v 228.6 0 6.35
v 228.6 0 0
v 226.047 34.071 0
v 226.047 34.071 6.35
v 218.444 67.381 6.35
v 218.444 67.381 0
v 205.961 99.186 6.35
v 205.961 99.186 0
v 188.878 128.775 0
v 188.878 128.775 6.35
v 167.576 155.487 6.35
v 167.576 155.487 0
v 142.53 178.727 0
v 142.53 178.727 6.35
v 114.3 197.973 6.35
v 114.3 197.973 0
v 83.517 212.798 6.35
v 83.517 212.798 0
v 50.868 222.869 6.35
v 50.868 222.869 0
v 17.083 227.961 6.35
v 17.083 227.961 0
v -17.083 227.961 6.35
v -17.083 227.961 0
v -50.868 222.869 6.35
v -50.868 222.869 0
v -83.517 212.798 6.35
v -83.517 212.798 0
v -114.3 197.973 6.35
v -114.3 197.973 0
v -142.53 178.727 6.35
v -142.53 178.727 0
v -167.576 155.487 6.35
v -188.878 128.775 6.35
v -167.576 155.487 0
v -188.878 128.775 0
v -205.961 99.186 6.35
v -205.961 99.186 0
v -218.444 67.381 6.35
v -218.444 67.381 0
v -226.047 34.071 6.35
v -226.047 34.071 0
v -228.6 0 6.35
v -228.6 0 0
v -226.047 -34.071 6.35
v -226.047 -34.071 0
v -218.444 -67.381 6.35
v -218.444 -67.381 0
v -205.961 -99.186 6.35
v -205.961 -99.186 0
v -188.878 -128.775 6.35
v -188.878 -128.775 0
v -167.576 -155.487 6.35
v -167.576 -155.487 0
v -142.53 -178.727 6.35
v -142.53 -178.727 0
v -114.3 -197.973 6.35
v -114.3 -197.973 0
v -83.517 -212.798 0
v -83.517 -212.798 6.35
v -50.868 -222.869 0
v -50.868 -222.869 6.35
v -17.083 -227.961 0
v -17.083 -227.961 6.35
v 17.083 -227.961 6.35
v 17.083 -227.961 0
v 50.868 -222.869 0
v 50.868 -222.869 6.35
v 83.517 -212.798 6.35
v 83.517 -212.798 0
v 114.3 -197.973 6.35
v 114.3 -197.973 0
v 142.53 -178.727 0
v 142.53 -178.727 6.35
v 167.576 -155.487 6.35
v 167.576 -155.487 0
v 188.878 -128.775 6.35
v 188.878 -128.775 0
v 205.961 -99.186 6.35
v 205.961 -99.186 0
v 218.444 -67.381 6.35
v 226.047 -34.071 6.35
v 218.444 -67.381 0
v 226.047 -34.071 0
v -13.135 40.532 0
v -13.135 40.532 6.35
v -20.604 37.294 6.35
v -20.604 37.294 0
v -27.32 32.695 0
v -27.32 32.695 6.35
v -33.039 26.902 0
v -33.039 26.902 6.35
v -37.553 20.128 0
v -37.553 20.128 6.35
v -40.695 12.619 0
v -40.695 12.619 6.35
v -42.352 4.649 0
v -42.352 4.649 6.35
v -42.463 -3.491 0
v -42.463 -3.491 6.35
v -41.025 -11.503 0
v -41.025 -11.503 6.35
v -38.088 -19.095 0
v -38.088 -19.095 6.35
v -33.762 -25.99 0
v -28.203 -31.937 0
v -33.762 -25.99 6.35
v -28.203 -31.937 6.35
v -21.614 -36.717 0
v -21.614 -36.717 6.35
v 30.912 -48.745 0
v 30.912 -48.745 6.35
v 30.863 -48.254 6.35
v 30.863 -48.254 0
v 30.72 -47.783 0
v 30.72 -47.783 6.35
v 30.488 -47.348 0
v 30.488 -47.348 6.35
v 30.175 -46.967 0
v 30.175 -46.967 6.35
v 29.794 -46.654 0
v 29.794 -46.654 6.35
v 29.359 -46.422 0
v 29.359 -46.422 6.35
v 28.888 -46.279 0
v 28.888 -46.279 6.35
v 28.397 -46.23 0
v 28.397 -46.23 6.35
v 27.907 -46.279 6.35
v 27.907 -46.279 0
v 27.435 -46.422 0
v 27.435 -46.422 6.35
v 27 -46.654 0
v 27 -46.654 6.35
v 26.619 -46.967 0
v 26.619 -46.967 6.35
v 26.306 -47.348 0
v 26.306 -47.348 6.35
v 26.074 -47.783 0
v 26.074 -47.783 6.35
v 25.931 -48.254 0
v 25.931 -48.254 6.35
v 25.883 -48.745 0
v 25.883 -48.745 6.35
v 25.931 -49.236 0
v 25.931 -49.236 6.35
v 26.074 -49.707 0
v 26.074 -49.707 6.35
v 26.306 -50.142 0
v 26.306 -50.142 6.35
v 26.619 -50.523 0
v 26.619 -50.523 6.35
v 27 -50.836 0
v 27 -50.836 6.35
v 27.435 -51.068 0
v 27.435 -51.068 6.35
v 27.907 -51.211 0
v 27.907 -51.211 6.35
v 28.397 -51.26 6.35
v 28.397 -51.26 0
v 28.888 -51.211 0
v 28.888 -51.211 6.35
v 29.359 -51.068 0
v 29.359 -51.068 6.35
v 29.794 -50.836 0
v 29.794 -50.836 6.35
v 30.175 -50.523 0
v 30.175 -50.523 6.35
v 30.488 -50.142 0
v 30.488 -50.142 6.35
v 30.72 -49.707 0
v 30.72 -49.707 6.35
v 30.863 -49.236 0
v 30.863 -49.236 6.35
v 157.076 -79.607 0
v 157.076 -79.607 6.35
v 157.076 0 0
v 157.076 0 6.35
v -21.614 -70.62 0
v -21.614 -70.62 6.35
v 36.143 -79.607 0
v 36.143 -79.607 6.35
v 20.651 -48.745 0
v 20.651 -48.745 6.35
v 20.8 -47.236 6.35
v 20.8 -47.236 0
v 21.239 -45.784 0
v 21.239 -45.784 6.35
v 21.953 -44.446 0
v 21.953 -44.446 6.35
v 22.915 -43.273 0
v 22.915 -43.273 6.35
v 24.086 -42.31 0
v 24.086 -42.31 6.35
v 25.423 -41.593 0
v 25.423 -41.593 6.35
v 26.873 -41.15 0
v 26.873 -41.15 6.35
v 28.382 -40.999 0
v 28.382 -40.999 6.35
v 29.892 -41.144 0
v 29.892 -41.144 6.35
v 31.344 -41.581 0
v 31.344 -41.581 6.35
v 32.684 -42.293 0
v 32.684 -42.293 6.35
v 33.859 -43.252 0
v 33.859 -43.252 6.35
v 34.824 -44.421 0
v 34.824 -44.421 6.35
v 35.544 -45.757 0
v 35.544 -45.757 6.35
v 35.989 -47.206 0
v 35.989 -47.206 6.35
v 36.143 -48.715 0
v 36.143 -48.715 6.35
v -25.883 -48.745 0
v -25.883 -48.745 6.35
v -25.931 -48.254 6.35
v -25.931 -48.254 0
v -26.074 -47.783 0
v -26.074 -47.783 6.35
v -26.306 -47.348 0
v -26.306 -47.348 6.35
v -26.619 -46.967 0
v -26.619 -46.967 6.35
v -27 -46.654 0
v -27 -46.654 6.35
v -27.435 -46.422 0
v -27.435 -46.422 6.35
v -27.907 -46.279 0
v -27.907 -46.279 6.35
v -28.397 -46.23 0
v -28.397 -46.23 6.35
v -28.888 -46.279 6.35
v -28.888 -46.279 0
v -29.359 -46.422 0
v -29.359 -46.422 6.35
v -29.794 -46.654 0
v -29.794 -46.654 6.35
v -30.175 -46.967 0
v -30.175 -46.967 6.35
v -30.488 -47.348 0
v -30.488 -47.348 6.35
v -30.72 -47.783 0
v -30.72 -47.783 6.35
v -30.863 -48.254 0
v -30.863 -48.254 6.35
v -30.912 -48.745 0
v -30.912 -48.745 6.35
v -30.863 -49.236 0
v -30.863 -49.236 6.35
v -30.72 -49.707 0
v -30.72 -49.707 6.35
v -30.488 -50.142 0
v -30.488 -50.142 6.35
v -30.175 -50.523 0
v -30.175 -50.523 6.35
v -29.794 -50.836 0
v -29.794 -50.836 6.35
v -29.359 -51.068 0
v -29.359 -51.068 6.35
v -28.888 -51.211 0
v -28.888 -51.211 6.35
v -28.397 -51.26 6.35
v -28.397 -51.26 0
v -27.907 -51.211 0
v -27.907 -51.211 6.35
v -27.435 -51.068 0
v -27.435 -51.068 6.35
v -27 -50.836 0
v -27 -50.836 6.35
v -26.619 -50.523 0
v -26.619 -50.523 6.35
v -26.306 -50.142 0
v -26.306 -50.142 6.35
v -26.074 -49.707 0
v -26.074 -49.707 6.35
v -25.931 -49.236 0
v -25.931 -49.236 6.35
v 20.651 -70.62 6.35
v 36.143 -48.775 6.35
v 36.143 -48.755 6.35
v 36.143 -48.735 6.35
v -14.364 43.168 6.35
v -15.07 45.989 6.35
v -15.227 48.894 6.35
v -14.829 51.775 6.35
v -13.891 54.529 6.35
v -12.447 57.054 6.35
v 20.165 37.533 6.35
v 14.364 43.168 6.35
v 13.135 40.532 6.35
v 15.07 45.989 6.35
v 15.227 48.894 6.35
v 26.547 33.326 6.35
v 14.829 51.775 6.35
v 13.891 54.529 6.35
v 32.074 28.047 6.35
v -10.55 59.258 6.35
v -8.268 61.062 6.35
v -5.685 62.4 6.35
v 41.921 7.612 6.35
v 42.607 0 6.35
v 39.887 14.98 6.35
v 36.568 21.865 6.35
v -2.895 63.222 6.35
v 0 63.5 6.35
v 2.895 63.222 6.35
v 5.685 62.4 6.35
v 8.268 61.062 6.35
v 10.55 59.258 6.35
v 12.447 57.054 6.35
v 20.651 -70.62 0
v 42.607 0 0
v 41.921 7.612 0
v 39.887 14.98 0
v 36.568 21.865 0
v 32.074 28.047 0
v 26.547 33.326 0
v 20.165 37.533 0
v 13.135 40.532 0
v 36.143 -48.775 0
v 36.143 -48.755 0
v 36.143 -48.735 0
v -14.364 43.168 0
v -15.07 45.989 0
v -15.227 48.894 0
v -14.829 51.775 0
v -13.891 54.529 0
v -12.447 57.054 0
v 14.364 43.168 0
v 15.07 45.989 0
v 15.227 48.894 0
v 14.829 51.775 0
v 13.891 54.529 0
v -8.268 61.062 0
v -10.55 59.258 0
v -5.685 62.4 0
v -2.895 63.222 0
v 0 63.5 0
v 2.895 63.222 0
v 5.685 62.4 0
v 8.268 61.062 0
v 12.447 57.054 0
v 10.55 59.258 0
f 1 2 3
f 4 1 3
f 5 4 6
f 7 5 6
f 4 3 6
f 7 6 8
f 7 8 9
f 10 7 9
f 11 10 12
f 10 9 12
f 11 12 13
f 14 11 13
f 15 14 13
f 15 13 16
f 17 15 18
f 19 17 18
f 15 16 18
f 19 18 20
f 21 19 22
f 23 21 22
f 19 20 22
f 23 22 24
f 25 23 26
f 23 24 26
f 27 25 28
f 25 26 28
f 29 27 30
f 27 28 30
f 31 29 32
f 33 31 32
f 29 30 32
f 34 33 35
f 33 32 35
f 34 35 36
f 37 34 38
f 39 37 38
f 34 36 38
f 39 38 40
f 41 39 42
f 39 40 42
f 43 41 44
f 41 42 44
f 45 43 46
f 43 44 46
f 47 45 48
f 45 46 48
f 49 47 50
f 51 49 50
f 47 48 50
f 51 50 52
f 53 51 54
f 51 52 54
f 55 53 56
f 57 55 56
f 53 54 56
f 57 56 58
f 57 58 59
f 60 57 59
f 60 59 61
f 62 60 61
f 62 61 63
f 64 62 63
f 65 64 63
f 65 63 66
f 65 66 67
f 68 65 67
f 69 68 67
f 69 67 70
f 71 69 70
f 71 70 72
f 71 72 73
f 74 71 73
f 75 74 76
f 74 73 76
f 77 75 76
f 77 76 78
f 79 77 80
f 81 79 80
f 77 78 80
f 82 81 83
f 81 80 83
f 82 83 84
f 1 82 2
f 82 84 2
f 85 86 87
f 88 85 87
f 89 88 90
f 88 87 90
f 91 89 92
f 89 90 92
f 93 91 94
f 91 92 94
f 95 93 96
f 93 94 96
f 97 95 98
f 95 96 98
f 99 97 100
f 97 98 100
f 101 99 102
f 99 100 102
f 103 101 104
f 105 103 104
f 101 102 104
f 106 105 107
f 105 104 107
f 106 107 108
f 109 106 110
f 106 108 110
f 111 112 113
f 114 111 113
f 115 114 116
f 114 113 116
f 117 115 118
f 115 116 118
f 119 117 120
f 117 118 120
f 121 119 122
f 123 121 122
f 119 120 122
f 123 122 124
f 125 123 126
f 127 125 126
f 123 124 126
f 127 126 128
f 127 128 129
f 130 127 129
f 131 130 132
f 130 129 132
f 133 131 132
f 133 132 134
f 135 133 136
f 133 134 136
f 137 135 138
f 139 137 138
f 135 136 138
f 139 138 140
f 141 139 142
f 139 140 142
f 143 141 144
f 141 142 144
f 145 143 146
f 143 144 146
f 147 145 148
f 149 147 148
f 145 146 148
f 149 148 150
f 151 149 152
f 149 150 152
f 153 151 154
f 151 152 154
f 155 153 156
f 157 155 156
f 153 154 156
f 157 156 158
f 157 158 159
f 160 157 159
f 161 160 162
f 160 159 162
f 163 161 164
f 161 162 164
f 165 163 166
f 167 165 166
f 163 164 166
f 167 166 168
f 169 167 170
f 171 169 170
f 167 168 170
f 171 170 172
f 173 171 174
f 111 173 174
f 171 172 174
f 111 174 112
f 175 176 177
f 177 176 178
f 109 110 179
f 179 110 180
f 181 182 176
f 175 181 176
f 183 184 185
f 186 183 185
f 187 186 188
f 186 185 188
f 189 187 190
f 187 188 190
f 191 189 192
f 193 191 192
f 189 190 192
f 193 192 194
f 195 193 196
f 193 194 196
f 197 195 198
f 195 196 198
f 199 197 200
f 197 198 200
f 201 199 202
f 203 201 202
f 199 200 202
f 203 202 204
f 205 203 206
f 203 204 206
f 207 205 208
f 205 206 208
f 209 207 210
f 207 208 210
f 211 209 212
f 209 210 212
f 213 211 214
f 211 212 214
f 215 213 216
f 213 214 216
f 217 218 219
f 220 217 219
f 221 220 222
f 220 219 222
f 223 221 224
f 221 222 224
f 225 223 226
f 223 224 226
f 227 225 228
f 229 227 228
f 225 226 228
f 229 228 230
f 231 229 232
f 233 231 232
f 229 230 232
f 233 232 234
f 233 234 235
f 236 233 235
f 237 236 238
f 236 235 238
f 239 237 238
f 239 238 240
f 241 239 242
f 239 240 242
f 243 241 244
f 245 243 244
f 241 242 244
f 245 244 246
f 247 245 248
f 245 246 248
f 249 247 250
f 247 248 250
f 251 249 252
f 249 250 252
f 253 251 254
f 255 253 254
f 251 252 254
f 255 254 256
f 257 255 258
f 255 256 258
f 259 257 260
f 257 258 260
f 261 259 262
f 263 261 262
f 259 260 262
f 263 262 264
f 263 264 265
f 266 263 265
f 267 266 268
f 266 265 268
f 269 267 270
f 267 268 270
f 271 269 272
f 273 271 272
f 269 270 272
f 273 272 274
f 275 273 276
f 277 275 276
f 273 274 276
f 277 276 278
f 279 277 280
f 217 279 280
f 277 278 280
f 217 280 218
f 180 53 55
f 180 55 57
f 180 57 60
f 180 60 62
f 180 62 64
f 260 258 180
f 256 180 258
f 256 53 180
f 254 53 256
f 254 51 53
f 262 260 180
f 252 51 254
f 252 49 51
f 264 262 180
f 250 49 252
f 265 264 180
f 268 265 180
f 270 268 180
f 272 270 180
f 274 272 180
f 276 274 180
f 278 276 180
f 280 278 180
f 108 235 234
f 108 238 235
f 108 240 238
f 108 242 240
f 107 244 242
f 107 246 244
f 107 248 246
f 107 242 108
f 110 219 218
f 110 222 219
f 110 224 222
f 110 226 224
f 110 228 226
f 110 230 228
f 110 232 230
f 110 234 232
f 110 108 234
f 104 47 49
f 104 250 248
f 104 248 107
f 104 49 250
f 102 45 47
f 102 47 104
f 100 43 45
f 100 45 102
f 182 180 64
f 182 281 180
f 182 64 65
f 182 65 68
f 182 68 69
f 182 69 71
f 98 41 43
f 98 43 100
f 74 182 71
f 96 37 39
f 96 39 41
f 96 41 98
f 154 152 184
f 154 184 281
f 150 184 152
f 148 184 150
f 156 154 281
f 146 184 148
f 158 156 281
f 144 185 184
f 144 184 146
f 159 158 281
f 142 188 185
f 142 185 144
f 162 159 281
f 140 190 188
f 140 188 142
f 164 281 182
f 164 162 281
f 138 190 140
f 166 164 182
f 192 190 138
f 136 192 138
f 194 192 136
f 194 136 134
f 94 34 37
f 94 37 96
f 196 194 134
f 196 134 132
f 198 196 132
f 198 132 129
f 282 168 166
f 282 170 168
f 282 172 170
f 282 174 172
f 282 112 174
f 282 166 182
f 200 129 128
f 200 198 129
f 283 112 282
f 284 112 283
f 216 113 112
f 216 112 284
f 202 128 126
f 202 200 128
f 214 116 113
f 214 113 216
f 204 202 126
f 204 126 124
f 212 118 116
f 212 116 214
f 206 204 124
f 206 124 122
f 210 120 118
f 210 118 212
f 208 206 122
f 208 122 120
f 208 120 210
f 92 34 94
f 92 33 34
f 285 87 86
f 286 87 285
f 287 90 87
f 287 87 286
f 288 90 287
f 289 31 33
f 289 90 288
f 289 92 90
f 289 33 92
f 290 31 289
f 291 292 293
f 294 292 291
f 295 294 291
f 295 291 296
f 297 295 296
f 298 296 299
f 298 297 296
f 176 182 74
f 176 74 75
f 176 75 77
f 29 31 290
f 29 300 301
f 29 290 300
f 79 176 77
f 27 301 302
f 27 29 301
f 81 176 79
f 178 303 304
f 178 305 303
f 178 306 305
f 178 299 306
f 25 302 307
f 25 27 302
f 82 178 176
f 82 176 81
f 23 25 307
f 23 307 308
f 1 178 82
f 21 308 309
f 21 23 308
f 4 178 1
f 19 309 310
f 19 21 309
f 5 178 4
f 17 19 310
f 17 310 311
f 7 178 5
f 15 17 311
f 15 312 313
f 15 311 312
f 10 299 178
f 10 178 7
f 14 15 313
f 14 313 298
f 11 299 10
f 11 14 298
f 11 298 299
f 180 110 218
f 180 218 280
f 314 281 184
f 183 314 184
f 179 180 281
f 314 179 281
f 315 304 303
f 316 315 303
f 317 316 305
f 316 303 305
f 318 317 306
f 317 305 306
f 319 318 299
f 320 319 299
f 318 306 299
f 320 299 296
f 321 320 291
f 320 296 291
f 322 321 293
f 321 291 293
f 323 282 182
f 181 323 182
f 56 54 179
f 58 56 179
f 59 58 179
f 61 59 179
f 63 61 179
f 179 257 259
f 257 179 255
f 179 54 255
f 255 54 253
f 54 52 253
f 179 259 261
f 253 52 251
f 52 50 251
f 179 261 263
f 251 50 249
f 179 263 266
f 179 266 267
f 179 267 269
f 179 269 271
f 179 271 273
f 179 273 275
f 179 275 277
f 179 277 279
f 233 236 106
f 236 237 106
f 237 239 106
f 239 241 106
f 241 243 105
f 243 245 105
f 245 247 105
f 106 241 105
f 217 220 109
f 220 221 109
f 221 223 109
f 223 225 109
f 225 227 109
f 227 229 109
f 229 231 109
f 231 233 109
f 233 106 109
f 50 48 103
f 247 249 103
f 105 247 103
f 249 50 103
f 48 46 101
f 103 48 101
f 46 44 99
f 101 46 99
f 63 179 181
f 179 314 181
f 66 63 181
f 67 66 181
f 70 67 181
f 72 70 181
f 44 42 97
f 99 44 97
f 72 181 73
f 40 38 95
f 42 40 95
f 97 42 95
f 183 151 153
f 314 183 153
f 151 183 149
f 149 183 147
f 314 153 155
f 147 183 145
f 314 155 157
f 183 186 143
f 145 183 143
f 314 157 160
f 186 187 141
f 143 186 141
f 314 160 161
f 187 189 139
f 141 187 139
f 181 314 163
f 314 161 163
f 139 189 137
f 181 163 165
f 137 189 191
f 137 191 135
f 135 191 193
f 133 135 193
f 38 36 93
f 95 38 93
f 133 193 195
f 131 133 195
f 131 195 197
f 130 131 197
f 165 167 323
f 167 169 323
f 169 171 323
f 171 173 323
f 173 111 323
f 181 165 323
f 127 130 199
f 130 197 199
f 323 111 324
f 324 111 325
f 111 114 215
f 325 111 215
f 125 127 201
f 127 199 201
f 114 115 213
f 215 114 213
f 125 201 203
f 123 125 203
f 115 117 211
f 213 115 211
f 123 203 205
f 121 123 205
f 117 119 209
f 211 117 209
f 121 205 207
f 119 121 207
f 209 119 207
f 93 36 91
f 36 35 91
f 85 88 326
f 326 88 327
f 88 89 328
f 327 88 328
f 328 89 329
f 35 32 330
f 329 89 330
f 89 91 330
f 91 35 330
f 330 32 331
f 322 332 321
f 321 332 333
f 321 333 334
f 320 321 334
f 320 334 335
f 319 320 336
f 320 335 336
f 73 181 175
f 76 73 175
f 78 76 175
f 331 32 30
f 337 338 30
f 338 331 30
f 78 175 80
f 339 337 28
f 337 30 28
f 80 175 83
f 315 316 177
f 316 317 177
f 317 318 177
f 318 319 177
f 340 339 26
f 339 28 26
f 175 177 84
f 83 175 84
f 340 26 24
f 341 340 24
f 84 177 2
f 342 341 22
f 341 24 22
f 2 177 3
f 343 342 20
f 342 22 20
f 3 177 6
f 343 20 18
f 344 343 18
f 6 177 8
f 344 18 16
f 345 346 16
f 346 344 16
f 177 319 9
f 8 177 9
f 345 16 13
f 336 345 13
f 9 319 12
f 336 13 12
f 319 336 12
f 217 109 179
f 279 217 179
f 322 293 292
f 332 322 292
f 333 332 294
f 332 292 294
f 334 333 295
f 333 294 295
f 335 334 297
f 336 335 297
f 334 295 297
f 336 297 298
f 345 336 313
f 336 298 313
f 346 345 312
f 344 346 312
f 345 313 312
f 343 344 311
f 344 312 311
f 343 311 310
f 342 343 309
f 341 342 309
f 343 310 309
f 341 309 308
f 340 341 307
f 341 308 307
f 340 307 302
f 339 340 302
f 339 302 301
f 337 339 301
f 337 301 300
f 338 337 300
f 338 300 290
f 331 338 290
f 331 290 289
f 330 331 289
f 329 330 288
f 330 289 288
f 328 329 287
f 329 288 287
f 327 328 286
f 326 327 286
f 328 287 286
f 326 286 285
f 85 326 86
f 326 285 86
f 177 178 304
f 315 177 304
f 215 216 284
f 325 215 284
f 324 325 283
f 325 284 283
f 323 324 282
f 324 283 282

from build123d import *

# Parameters (mm, degrees)
F0_R     = 228.6
F1_DEPTH = 6.35
F2_R     = 2.5146
F3_DEPTH = 6.35
F5_DEPTH = 6.35


with BuildPart() as f1:
    # F0 (on Top) → F1 (new body)
    with BuildSketch(Plane.XY):
        Circle(F0_R)
    extrude(amount=F1_DEPTH)

    # F2 (on face) → F3 (cut, through all)
    with BuildSketch(Plane.XY.offset(6.35)):
        with Locations((0, 48.7172)):
            Circle(F2_R)
        with Locations((28.3972, -48.744956)):
            Circle(F2_R)
        with Locations((-28.3972, -48.744956)):
            Circle(F2_R)
    extrude(amount=-F3_DEPTH, mode=Mode.SUBTRACT)

    # F4 (on face) → F5 (cut, through all)
    with BuildSketch(Plane.XY.offset(6.35)):
        with BuildLine():
            Line((157.075703, 0), (42.606701, 0))
            ThreePointArc((42.606701, 0), (34.459901, 25.056859), (13.134991, 40.531506))
            ThreePointArc((13.134991, 40.531506), (0, 63.5), (-13.134991, 40.531506))
            ThreePointArc((-13.134991, 40.531506), (-42.352335, 4.648728), (-21.614071, -36.717338))
            Line((-21.614071, -36.717338), (-21.614071, -70.620485))
            Line((-21.614071, -70.620485), (20.651158, -70.620485))
            Line((20.651158, -70.620485), (20.651158, -48.744956))
            ThreePointArc((20.651158, -48.744956), (28.382287, -40.998928), (36.143185, -48.715129))
            ThreePointArc((36.143185, -48.715129), (36.143242, -48.744956), (36.143185, -48.774783))
            Line((36.143185, -48.774783), (36.143185, -79.606533))
            Line((36.143185, -79.606533), (157.075703, -79.606533))
            Line((157.075703, -79.606533), (157.075703, 0))
        make_face()
    extrude(amount=-F5_DEPTH, mode=Mode.SUBTRACT)


solid = f1.part
